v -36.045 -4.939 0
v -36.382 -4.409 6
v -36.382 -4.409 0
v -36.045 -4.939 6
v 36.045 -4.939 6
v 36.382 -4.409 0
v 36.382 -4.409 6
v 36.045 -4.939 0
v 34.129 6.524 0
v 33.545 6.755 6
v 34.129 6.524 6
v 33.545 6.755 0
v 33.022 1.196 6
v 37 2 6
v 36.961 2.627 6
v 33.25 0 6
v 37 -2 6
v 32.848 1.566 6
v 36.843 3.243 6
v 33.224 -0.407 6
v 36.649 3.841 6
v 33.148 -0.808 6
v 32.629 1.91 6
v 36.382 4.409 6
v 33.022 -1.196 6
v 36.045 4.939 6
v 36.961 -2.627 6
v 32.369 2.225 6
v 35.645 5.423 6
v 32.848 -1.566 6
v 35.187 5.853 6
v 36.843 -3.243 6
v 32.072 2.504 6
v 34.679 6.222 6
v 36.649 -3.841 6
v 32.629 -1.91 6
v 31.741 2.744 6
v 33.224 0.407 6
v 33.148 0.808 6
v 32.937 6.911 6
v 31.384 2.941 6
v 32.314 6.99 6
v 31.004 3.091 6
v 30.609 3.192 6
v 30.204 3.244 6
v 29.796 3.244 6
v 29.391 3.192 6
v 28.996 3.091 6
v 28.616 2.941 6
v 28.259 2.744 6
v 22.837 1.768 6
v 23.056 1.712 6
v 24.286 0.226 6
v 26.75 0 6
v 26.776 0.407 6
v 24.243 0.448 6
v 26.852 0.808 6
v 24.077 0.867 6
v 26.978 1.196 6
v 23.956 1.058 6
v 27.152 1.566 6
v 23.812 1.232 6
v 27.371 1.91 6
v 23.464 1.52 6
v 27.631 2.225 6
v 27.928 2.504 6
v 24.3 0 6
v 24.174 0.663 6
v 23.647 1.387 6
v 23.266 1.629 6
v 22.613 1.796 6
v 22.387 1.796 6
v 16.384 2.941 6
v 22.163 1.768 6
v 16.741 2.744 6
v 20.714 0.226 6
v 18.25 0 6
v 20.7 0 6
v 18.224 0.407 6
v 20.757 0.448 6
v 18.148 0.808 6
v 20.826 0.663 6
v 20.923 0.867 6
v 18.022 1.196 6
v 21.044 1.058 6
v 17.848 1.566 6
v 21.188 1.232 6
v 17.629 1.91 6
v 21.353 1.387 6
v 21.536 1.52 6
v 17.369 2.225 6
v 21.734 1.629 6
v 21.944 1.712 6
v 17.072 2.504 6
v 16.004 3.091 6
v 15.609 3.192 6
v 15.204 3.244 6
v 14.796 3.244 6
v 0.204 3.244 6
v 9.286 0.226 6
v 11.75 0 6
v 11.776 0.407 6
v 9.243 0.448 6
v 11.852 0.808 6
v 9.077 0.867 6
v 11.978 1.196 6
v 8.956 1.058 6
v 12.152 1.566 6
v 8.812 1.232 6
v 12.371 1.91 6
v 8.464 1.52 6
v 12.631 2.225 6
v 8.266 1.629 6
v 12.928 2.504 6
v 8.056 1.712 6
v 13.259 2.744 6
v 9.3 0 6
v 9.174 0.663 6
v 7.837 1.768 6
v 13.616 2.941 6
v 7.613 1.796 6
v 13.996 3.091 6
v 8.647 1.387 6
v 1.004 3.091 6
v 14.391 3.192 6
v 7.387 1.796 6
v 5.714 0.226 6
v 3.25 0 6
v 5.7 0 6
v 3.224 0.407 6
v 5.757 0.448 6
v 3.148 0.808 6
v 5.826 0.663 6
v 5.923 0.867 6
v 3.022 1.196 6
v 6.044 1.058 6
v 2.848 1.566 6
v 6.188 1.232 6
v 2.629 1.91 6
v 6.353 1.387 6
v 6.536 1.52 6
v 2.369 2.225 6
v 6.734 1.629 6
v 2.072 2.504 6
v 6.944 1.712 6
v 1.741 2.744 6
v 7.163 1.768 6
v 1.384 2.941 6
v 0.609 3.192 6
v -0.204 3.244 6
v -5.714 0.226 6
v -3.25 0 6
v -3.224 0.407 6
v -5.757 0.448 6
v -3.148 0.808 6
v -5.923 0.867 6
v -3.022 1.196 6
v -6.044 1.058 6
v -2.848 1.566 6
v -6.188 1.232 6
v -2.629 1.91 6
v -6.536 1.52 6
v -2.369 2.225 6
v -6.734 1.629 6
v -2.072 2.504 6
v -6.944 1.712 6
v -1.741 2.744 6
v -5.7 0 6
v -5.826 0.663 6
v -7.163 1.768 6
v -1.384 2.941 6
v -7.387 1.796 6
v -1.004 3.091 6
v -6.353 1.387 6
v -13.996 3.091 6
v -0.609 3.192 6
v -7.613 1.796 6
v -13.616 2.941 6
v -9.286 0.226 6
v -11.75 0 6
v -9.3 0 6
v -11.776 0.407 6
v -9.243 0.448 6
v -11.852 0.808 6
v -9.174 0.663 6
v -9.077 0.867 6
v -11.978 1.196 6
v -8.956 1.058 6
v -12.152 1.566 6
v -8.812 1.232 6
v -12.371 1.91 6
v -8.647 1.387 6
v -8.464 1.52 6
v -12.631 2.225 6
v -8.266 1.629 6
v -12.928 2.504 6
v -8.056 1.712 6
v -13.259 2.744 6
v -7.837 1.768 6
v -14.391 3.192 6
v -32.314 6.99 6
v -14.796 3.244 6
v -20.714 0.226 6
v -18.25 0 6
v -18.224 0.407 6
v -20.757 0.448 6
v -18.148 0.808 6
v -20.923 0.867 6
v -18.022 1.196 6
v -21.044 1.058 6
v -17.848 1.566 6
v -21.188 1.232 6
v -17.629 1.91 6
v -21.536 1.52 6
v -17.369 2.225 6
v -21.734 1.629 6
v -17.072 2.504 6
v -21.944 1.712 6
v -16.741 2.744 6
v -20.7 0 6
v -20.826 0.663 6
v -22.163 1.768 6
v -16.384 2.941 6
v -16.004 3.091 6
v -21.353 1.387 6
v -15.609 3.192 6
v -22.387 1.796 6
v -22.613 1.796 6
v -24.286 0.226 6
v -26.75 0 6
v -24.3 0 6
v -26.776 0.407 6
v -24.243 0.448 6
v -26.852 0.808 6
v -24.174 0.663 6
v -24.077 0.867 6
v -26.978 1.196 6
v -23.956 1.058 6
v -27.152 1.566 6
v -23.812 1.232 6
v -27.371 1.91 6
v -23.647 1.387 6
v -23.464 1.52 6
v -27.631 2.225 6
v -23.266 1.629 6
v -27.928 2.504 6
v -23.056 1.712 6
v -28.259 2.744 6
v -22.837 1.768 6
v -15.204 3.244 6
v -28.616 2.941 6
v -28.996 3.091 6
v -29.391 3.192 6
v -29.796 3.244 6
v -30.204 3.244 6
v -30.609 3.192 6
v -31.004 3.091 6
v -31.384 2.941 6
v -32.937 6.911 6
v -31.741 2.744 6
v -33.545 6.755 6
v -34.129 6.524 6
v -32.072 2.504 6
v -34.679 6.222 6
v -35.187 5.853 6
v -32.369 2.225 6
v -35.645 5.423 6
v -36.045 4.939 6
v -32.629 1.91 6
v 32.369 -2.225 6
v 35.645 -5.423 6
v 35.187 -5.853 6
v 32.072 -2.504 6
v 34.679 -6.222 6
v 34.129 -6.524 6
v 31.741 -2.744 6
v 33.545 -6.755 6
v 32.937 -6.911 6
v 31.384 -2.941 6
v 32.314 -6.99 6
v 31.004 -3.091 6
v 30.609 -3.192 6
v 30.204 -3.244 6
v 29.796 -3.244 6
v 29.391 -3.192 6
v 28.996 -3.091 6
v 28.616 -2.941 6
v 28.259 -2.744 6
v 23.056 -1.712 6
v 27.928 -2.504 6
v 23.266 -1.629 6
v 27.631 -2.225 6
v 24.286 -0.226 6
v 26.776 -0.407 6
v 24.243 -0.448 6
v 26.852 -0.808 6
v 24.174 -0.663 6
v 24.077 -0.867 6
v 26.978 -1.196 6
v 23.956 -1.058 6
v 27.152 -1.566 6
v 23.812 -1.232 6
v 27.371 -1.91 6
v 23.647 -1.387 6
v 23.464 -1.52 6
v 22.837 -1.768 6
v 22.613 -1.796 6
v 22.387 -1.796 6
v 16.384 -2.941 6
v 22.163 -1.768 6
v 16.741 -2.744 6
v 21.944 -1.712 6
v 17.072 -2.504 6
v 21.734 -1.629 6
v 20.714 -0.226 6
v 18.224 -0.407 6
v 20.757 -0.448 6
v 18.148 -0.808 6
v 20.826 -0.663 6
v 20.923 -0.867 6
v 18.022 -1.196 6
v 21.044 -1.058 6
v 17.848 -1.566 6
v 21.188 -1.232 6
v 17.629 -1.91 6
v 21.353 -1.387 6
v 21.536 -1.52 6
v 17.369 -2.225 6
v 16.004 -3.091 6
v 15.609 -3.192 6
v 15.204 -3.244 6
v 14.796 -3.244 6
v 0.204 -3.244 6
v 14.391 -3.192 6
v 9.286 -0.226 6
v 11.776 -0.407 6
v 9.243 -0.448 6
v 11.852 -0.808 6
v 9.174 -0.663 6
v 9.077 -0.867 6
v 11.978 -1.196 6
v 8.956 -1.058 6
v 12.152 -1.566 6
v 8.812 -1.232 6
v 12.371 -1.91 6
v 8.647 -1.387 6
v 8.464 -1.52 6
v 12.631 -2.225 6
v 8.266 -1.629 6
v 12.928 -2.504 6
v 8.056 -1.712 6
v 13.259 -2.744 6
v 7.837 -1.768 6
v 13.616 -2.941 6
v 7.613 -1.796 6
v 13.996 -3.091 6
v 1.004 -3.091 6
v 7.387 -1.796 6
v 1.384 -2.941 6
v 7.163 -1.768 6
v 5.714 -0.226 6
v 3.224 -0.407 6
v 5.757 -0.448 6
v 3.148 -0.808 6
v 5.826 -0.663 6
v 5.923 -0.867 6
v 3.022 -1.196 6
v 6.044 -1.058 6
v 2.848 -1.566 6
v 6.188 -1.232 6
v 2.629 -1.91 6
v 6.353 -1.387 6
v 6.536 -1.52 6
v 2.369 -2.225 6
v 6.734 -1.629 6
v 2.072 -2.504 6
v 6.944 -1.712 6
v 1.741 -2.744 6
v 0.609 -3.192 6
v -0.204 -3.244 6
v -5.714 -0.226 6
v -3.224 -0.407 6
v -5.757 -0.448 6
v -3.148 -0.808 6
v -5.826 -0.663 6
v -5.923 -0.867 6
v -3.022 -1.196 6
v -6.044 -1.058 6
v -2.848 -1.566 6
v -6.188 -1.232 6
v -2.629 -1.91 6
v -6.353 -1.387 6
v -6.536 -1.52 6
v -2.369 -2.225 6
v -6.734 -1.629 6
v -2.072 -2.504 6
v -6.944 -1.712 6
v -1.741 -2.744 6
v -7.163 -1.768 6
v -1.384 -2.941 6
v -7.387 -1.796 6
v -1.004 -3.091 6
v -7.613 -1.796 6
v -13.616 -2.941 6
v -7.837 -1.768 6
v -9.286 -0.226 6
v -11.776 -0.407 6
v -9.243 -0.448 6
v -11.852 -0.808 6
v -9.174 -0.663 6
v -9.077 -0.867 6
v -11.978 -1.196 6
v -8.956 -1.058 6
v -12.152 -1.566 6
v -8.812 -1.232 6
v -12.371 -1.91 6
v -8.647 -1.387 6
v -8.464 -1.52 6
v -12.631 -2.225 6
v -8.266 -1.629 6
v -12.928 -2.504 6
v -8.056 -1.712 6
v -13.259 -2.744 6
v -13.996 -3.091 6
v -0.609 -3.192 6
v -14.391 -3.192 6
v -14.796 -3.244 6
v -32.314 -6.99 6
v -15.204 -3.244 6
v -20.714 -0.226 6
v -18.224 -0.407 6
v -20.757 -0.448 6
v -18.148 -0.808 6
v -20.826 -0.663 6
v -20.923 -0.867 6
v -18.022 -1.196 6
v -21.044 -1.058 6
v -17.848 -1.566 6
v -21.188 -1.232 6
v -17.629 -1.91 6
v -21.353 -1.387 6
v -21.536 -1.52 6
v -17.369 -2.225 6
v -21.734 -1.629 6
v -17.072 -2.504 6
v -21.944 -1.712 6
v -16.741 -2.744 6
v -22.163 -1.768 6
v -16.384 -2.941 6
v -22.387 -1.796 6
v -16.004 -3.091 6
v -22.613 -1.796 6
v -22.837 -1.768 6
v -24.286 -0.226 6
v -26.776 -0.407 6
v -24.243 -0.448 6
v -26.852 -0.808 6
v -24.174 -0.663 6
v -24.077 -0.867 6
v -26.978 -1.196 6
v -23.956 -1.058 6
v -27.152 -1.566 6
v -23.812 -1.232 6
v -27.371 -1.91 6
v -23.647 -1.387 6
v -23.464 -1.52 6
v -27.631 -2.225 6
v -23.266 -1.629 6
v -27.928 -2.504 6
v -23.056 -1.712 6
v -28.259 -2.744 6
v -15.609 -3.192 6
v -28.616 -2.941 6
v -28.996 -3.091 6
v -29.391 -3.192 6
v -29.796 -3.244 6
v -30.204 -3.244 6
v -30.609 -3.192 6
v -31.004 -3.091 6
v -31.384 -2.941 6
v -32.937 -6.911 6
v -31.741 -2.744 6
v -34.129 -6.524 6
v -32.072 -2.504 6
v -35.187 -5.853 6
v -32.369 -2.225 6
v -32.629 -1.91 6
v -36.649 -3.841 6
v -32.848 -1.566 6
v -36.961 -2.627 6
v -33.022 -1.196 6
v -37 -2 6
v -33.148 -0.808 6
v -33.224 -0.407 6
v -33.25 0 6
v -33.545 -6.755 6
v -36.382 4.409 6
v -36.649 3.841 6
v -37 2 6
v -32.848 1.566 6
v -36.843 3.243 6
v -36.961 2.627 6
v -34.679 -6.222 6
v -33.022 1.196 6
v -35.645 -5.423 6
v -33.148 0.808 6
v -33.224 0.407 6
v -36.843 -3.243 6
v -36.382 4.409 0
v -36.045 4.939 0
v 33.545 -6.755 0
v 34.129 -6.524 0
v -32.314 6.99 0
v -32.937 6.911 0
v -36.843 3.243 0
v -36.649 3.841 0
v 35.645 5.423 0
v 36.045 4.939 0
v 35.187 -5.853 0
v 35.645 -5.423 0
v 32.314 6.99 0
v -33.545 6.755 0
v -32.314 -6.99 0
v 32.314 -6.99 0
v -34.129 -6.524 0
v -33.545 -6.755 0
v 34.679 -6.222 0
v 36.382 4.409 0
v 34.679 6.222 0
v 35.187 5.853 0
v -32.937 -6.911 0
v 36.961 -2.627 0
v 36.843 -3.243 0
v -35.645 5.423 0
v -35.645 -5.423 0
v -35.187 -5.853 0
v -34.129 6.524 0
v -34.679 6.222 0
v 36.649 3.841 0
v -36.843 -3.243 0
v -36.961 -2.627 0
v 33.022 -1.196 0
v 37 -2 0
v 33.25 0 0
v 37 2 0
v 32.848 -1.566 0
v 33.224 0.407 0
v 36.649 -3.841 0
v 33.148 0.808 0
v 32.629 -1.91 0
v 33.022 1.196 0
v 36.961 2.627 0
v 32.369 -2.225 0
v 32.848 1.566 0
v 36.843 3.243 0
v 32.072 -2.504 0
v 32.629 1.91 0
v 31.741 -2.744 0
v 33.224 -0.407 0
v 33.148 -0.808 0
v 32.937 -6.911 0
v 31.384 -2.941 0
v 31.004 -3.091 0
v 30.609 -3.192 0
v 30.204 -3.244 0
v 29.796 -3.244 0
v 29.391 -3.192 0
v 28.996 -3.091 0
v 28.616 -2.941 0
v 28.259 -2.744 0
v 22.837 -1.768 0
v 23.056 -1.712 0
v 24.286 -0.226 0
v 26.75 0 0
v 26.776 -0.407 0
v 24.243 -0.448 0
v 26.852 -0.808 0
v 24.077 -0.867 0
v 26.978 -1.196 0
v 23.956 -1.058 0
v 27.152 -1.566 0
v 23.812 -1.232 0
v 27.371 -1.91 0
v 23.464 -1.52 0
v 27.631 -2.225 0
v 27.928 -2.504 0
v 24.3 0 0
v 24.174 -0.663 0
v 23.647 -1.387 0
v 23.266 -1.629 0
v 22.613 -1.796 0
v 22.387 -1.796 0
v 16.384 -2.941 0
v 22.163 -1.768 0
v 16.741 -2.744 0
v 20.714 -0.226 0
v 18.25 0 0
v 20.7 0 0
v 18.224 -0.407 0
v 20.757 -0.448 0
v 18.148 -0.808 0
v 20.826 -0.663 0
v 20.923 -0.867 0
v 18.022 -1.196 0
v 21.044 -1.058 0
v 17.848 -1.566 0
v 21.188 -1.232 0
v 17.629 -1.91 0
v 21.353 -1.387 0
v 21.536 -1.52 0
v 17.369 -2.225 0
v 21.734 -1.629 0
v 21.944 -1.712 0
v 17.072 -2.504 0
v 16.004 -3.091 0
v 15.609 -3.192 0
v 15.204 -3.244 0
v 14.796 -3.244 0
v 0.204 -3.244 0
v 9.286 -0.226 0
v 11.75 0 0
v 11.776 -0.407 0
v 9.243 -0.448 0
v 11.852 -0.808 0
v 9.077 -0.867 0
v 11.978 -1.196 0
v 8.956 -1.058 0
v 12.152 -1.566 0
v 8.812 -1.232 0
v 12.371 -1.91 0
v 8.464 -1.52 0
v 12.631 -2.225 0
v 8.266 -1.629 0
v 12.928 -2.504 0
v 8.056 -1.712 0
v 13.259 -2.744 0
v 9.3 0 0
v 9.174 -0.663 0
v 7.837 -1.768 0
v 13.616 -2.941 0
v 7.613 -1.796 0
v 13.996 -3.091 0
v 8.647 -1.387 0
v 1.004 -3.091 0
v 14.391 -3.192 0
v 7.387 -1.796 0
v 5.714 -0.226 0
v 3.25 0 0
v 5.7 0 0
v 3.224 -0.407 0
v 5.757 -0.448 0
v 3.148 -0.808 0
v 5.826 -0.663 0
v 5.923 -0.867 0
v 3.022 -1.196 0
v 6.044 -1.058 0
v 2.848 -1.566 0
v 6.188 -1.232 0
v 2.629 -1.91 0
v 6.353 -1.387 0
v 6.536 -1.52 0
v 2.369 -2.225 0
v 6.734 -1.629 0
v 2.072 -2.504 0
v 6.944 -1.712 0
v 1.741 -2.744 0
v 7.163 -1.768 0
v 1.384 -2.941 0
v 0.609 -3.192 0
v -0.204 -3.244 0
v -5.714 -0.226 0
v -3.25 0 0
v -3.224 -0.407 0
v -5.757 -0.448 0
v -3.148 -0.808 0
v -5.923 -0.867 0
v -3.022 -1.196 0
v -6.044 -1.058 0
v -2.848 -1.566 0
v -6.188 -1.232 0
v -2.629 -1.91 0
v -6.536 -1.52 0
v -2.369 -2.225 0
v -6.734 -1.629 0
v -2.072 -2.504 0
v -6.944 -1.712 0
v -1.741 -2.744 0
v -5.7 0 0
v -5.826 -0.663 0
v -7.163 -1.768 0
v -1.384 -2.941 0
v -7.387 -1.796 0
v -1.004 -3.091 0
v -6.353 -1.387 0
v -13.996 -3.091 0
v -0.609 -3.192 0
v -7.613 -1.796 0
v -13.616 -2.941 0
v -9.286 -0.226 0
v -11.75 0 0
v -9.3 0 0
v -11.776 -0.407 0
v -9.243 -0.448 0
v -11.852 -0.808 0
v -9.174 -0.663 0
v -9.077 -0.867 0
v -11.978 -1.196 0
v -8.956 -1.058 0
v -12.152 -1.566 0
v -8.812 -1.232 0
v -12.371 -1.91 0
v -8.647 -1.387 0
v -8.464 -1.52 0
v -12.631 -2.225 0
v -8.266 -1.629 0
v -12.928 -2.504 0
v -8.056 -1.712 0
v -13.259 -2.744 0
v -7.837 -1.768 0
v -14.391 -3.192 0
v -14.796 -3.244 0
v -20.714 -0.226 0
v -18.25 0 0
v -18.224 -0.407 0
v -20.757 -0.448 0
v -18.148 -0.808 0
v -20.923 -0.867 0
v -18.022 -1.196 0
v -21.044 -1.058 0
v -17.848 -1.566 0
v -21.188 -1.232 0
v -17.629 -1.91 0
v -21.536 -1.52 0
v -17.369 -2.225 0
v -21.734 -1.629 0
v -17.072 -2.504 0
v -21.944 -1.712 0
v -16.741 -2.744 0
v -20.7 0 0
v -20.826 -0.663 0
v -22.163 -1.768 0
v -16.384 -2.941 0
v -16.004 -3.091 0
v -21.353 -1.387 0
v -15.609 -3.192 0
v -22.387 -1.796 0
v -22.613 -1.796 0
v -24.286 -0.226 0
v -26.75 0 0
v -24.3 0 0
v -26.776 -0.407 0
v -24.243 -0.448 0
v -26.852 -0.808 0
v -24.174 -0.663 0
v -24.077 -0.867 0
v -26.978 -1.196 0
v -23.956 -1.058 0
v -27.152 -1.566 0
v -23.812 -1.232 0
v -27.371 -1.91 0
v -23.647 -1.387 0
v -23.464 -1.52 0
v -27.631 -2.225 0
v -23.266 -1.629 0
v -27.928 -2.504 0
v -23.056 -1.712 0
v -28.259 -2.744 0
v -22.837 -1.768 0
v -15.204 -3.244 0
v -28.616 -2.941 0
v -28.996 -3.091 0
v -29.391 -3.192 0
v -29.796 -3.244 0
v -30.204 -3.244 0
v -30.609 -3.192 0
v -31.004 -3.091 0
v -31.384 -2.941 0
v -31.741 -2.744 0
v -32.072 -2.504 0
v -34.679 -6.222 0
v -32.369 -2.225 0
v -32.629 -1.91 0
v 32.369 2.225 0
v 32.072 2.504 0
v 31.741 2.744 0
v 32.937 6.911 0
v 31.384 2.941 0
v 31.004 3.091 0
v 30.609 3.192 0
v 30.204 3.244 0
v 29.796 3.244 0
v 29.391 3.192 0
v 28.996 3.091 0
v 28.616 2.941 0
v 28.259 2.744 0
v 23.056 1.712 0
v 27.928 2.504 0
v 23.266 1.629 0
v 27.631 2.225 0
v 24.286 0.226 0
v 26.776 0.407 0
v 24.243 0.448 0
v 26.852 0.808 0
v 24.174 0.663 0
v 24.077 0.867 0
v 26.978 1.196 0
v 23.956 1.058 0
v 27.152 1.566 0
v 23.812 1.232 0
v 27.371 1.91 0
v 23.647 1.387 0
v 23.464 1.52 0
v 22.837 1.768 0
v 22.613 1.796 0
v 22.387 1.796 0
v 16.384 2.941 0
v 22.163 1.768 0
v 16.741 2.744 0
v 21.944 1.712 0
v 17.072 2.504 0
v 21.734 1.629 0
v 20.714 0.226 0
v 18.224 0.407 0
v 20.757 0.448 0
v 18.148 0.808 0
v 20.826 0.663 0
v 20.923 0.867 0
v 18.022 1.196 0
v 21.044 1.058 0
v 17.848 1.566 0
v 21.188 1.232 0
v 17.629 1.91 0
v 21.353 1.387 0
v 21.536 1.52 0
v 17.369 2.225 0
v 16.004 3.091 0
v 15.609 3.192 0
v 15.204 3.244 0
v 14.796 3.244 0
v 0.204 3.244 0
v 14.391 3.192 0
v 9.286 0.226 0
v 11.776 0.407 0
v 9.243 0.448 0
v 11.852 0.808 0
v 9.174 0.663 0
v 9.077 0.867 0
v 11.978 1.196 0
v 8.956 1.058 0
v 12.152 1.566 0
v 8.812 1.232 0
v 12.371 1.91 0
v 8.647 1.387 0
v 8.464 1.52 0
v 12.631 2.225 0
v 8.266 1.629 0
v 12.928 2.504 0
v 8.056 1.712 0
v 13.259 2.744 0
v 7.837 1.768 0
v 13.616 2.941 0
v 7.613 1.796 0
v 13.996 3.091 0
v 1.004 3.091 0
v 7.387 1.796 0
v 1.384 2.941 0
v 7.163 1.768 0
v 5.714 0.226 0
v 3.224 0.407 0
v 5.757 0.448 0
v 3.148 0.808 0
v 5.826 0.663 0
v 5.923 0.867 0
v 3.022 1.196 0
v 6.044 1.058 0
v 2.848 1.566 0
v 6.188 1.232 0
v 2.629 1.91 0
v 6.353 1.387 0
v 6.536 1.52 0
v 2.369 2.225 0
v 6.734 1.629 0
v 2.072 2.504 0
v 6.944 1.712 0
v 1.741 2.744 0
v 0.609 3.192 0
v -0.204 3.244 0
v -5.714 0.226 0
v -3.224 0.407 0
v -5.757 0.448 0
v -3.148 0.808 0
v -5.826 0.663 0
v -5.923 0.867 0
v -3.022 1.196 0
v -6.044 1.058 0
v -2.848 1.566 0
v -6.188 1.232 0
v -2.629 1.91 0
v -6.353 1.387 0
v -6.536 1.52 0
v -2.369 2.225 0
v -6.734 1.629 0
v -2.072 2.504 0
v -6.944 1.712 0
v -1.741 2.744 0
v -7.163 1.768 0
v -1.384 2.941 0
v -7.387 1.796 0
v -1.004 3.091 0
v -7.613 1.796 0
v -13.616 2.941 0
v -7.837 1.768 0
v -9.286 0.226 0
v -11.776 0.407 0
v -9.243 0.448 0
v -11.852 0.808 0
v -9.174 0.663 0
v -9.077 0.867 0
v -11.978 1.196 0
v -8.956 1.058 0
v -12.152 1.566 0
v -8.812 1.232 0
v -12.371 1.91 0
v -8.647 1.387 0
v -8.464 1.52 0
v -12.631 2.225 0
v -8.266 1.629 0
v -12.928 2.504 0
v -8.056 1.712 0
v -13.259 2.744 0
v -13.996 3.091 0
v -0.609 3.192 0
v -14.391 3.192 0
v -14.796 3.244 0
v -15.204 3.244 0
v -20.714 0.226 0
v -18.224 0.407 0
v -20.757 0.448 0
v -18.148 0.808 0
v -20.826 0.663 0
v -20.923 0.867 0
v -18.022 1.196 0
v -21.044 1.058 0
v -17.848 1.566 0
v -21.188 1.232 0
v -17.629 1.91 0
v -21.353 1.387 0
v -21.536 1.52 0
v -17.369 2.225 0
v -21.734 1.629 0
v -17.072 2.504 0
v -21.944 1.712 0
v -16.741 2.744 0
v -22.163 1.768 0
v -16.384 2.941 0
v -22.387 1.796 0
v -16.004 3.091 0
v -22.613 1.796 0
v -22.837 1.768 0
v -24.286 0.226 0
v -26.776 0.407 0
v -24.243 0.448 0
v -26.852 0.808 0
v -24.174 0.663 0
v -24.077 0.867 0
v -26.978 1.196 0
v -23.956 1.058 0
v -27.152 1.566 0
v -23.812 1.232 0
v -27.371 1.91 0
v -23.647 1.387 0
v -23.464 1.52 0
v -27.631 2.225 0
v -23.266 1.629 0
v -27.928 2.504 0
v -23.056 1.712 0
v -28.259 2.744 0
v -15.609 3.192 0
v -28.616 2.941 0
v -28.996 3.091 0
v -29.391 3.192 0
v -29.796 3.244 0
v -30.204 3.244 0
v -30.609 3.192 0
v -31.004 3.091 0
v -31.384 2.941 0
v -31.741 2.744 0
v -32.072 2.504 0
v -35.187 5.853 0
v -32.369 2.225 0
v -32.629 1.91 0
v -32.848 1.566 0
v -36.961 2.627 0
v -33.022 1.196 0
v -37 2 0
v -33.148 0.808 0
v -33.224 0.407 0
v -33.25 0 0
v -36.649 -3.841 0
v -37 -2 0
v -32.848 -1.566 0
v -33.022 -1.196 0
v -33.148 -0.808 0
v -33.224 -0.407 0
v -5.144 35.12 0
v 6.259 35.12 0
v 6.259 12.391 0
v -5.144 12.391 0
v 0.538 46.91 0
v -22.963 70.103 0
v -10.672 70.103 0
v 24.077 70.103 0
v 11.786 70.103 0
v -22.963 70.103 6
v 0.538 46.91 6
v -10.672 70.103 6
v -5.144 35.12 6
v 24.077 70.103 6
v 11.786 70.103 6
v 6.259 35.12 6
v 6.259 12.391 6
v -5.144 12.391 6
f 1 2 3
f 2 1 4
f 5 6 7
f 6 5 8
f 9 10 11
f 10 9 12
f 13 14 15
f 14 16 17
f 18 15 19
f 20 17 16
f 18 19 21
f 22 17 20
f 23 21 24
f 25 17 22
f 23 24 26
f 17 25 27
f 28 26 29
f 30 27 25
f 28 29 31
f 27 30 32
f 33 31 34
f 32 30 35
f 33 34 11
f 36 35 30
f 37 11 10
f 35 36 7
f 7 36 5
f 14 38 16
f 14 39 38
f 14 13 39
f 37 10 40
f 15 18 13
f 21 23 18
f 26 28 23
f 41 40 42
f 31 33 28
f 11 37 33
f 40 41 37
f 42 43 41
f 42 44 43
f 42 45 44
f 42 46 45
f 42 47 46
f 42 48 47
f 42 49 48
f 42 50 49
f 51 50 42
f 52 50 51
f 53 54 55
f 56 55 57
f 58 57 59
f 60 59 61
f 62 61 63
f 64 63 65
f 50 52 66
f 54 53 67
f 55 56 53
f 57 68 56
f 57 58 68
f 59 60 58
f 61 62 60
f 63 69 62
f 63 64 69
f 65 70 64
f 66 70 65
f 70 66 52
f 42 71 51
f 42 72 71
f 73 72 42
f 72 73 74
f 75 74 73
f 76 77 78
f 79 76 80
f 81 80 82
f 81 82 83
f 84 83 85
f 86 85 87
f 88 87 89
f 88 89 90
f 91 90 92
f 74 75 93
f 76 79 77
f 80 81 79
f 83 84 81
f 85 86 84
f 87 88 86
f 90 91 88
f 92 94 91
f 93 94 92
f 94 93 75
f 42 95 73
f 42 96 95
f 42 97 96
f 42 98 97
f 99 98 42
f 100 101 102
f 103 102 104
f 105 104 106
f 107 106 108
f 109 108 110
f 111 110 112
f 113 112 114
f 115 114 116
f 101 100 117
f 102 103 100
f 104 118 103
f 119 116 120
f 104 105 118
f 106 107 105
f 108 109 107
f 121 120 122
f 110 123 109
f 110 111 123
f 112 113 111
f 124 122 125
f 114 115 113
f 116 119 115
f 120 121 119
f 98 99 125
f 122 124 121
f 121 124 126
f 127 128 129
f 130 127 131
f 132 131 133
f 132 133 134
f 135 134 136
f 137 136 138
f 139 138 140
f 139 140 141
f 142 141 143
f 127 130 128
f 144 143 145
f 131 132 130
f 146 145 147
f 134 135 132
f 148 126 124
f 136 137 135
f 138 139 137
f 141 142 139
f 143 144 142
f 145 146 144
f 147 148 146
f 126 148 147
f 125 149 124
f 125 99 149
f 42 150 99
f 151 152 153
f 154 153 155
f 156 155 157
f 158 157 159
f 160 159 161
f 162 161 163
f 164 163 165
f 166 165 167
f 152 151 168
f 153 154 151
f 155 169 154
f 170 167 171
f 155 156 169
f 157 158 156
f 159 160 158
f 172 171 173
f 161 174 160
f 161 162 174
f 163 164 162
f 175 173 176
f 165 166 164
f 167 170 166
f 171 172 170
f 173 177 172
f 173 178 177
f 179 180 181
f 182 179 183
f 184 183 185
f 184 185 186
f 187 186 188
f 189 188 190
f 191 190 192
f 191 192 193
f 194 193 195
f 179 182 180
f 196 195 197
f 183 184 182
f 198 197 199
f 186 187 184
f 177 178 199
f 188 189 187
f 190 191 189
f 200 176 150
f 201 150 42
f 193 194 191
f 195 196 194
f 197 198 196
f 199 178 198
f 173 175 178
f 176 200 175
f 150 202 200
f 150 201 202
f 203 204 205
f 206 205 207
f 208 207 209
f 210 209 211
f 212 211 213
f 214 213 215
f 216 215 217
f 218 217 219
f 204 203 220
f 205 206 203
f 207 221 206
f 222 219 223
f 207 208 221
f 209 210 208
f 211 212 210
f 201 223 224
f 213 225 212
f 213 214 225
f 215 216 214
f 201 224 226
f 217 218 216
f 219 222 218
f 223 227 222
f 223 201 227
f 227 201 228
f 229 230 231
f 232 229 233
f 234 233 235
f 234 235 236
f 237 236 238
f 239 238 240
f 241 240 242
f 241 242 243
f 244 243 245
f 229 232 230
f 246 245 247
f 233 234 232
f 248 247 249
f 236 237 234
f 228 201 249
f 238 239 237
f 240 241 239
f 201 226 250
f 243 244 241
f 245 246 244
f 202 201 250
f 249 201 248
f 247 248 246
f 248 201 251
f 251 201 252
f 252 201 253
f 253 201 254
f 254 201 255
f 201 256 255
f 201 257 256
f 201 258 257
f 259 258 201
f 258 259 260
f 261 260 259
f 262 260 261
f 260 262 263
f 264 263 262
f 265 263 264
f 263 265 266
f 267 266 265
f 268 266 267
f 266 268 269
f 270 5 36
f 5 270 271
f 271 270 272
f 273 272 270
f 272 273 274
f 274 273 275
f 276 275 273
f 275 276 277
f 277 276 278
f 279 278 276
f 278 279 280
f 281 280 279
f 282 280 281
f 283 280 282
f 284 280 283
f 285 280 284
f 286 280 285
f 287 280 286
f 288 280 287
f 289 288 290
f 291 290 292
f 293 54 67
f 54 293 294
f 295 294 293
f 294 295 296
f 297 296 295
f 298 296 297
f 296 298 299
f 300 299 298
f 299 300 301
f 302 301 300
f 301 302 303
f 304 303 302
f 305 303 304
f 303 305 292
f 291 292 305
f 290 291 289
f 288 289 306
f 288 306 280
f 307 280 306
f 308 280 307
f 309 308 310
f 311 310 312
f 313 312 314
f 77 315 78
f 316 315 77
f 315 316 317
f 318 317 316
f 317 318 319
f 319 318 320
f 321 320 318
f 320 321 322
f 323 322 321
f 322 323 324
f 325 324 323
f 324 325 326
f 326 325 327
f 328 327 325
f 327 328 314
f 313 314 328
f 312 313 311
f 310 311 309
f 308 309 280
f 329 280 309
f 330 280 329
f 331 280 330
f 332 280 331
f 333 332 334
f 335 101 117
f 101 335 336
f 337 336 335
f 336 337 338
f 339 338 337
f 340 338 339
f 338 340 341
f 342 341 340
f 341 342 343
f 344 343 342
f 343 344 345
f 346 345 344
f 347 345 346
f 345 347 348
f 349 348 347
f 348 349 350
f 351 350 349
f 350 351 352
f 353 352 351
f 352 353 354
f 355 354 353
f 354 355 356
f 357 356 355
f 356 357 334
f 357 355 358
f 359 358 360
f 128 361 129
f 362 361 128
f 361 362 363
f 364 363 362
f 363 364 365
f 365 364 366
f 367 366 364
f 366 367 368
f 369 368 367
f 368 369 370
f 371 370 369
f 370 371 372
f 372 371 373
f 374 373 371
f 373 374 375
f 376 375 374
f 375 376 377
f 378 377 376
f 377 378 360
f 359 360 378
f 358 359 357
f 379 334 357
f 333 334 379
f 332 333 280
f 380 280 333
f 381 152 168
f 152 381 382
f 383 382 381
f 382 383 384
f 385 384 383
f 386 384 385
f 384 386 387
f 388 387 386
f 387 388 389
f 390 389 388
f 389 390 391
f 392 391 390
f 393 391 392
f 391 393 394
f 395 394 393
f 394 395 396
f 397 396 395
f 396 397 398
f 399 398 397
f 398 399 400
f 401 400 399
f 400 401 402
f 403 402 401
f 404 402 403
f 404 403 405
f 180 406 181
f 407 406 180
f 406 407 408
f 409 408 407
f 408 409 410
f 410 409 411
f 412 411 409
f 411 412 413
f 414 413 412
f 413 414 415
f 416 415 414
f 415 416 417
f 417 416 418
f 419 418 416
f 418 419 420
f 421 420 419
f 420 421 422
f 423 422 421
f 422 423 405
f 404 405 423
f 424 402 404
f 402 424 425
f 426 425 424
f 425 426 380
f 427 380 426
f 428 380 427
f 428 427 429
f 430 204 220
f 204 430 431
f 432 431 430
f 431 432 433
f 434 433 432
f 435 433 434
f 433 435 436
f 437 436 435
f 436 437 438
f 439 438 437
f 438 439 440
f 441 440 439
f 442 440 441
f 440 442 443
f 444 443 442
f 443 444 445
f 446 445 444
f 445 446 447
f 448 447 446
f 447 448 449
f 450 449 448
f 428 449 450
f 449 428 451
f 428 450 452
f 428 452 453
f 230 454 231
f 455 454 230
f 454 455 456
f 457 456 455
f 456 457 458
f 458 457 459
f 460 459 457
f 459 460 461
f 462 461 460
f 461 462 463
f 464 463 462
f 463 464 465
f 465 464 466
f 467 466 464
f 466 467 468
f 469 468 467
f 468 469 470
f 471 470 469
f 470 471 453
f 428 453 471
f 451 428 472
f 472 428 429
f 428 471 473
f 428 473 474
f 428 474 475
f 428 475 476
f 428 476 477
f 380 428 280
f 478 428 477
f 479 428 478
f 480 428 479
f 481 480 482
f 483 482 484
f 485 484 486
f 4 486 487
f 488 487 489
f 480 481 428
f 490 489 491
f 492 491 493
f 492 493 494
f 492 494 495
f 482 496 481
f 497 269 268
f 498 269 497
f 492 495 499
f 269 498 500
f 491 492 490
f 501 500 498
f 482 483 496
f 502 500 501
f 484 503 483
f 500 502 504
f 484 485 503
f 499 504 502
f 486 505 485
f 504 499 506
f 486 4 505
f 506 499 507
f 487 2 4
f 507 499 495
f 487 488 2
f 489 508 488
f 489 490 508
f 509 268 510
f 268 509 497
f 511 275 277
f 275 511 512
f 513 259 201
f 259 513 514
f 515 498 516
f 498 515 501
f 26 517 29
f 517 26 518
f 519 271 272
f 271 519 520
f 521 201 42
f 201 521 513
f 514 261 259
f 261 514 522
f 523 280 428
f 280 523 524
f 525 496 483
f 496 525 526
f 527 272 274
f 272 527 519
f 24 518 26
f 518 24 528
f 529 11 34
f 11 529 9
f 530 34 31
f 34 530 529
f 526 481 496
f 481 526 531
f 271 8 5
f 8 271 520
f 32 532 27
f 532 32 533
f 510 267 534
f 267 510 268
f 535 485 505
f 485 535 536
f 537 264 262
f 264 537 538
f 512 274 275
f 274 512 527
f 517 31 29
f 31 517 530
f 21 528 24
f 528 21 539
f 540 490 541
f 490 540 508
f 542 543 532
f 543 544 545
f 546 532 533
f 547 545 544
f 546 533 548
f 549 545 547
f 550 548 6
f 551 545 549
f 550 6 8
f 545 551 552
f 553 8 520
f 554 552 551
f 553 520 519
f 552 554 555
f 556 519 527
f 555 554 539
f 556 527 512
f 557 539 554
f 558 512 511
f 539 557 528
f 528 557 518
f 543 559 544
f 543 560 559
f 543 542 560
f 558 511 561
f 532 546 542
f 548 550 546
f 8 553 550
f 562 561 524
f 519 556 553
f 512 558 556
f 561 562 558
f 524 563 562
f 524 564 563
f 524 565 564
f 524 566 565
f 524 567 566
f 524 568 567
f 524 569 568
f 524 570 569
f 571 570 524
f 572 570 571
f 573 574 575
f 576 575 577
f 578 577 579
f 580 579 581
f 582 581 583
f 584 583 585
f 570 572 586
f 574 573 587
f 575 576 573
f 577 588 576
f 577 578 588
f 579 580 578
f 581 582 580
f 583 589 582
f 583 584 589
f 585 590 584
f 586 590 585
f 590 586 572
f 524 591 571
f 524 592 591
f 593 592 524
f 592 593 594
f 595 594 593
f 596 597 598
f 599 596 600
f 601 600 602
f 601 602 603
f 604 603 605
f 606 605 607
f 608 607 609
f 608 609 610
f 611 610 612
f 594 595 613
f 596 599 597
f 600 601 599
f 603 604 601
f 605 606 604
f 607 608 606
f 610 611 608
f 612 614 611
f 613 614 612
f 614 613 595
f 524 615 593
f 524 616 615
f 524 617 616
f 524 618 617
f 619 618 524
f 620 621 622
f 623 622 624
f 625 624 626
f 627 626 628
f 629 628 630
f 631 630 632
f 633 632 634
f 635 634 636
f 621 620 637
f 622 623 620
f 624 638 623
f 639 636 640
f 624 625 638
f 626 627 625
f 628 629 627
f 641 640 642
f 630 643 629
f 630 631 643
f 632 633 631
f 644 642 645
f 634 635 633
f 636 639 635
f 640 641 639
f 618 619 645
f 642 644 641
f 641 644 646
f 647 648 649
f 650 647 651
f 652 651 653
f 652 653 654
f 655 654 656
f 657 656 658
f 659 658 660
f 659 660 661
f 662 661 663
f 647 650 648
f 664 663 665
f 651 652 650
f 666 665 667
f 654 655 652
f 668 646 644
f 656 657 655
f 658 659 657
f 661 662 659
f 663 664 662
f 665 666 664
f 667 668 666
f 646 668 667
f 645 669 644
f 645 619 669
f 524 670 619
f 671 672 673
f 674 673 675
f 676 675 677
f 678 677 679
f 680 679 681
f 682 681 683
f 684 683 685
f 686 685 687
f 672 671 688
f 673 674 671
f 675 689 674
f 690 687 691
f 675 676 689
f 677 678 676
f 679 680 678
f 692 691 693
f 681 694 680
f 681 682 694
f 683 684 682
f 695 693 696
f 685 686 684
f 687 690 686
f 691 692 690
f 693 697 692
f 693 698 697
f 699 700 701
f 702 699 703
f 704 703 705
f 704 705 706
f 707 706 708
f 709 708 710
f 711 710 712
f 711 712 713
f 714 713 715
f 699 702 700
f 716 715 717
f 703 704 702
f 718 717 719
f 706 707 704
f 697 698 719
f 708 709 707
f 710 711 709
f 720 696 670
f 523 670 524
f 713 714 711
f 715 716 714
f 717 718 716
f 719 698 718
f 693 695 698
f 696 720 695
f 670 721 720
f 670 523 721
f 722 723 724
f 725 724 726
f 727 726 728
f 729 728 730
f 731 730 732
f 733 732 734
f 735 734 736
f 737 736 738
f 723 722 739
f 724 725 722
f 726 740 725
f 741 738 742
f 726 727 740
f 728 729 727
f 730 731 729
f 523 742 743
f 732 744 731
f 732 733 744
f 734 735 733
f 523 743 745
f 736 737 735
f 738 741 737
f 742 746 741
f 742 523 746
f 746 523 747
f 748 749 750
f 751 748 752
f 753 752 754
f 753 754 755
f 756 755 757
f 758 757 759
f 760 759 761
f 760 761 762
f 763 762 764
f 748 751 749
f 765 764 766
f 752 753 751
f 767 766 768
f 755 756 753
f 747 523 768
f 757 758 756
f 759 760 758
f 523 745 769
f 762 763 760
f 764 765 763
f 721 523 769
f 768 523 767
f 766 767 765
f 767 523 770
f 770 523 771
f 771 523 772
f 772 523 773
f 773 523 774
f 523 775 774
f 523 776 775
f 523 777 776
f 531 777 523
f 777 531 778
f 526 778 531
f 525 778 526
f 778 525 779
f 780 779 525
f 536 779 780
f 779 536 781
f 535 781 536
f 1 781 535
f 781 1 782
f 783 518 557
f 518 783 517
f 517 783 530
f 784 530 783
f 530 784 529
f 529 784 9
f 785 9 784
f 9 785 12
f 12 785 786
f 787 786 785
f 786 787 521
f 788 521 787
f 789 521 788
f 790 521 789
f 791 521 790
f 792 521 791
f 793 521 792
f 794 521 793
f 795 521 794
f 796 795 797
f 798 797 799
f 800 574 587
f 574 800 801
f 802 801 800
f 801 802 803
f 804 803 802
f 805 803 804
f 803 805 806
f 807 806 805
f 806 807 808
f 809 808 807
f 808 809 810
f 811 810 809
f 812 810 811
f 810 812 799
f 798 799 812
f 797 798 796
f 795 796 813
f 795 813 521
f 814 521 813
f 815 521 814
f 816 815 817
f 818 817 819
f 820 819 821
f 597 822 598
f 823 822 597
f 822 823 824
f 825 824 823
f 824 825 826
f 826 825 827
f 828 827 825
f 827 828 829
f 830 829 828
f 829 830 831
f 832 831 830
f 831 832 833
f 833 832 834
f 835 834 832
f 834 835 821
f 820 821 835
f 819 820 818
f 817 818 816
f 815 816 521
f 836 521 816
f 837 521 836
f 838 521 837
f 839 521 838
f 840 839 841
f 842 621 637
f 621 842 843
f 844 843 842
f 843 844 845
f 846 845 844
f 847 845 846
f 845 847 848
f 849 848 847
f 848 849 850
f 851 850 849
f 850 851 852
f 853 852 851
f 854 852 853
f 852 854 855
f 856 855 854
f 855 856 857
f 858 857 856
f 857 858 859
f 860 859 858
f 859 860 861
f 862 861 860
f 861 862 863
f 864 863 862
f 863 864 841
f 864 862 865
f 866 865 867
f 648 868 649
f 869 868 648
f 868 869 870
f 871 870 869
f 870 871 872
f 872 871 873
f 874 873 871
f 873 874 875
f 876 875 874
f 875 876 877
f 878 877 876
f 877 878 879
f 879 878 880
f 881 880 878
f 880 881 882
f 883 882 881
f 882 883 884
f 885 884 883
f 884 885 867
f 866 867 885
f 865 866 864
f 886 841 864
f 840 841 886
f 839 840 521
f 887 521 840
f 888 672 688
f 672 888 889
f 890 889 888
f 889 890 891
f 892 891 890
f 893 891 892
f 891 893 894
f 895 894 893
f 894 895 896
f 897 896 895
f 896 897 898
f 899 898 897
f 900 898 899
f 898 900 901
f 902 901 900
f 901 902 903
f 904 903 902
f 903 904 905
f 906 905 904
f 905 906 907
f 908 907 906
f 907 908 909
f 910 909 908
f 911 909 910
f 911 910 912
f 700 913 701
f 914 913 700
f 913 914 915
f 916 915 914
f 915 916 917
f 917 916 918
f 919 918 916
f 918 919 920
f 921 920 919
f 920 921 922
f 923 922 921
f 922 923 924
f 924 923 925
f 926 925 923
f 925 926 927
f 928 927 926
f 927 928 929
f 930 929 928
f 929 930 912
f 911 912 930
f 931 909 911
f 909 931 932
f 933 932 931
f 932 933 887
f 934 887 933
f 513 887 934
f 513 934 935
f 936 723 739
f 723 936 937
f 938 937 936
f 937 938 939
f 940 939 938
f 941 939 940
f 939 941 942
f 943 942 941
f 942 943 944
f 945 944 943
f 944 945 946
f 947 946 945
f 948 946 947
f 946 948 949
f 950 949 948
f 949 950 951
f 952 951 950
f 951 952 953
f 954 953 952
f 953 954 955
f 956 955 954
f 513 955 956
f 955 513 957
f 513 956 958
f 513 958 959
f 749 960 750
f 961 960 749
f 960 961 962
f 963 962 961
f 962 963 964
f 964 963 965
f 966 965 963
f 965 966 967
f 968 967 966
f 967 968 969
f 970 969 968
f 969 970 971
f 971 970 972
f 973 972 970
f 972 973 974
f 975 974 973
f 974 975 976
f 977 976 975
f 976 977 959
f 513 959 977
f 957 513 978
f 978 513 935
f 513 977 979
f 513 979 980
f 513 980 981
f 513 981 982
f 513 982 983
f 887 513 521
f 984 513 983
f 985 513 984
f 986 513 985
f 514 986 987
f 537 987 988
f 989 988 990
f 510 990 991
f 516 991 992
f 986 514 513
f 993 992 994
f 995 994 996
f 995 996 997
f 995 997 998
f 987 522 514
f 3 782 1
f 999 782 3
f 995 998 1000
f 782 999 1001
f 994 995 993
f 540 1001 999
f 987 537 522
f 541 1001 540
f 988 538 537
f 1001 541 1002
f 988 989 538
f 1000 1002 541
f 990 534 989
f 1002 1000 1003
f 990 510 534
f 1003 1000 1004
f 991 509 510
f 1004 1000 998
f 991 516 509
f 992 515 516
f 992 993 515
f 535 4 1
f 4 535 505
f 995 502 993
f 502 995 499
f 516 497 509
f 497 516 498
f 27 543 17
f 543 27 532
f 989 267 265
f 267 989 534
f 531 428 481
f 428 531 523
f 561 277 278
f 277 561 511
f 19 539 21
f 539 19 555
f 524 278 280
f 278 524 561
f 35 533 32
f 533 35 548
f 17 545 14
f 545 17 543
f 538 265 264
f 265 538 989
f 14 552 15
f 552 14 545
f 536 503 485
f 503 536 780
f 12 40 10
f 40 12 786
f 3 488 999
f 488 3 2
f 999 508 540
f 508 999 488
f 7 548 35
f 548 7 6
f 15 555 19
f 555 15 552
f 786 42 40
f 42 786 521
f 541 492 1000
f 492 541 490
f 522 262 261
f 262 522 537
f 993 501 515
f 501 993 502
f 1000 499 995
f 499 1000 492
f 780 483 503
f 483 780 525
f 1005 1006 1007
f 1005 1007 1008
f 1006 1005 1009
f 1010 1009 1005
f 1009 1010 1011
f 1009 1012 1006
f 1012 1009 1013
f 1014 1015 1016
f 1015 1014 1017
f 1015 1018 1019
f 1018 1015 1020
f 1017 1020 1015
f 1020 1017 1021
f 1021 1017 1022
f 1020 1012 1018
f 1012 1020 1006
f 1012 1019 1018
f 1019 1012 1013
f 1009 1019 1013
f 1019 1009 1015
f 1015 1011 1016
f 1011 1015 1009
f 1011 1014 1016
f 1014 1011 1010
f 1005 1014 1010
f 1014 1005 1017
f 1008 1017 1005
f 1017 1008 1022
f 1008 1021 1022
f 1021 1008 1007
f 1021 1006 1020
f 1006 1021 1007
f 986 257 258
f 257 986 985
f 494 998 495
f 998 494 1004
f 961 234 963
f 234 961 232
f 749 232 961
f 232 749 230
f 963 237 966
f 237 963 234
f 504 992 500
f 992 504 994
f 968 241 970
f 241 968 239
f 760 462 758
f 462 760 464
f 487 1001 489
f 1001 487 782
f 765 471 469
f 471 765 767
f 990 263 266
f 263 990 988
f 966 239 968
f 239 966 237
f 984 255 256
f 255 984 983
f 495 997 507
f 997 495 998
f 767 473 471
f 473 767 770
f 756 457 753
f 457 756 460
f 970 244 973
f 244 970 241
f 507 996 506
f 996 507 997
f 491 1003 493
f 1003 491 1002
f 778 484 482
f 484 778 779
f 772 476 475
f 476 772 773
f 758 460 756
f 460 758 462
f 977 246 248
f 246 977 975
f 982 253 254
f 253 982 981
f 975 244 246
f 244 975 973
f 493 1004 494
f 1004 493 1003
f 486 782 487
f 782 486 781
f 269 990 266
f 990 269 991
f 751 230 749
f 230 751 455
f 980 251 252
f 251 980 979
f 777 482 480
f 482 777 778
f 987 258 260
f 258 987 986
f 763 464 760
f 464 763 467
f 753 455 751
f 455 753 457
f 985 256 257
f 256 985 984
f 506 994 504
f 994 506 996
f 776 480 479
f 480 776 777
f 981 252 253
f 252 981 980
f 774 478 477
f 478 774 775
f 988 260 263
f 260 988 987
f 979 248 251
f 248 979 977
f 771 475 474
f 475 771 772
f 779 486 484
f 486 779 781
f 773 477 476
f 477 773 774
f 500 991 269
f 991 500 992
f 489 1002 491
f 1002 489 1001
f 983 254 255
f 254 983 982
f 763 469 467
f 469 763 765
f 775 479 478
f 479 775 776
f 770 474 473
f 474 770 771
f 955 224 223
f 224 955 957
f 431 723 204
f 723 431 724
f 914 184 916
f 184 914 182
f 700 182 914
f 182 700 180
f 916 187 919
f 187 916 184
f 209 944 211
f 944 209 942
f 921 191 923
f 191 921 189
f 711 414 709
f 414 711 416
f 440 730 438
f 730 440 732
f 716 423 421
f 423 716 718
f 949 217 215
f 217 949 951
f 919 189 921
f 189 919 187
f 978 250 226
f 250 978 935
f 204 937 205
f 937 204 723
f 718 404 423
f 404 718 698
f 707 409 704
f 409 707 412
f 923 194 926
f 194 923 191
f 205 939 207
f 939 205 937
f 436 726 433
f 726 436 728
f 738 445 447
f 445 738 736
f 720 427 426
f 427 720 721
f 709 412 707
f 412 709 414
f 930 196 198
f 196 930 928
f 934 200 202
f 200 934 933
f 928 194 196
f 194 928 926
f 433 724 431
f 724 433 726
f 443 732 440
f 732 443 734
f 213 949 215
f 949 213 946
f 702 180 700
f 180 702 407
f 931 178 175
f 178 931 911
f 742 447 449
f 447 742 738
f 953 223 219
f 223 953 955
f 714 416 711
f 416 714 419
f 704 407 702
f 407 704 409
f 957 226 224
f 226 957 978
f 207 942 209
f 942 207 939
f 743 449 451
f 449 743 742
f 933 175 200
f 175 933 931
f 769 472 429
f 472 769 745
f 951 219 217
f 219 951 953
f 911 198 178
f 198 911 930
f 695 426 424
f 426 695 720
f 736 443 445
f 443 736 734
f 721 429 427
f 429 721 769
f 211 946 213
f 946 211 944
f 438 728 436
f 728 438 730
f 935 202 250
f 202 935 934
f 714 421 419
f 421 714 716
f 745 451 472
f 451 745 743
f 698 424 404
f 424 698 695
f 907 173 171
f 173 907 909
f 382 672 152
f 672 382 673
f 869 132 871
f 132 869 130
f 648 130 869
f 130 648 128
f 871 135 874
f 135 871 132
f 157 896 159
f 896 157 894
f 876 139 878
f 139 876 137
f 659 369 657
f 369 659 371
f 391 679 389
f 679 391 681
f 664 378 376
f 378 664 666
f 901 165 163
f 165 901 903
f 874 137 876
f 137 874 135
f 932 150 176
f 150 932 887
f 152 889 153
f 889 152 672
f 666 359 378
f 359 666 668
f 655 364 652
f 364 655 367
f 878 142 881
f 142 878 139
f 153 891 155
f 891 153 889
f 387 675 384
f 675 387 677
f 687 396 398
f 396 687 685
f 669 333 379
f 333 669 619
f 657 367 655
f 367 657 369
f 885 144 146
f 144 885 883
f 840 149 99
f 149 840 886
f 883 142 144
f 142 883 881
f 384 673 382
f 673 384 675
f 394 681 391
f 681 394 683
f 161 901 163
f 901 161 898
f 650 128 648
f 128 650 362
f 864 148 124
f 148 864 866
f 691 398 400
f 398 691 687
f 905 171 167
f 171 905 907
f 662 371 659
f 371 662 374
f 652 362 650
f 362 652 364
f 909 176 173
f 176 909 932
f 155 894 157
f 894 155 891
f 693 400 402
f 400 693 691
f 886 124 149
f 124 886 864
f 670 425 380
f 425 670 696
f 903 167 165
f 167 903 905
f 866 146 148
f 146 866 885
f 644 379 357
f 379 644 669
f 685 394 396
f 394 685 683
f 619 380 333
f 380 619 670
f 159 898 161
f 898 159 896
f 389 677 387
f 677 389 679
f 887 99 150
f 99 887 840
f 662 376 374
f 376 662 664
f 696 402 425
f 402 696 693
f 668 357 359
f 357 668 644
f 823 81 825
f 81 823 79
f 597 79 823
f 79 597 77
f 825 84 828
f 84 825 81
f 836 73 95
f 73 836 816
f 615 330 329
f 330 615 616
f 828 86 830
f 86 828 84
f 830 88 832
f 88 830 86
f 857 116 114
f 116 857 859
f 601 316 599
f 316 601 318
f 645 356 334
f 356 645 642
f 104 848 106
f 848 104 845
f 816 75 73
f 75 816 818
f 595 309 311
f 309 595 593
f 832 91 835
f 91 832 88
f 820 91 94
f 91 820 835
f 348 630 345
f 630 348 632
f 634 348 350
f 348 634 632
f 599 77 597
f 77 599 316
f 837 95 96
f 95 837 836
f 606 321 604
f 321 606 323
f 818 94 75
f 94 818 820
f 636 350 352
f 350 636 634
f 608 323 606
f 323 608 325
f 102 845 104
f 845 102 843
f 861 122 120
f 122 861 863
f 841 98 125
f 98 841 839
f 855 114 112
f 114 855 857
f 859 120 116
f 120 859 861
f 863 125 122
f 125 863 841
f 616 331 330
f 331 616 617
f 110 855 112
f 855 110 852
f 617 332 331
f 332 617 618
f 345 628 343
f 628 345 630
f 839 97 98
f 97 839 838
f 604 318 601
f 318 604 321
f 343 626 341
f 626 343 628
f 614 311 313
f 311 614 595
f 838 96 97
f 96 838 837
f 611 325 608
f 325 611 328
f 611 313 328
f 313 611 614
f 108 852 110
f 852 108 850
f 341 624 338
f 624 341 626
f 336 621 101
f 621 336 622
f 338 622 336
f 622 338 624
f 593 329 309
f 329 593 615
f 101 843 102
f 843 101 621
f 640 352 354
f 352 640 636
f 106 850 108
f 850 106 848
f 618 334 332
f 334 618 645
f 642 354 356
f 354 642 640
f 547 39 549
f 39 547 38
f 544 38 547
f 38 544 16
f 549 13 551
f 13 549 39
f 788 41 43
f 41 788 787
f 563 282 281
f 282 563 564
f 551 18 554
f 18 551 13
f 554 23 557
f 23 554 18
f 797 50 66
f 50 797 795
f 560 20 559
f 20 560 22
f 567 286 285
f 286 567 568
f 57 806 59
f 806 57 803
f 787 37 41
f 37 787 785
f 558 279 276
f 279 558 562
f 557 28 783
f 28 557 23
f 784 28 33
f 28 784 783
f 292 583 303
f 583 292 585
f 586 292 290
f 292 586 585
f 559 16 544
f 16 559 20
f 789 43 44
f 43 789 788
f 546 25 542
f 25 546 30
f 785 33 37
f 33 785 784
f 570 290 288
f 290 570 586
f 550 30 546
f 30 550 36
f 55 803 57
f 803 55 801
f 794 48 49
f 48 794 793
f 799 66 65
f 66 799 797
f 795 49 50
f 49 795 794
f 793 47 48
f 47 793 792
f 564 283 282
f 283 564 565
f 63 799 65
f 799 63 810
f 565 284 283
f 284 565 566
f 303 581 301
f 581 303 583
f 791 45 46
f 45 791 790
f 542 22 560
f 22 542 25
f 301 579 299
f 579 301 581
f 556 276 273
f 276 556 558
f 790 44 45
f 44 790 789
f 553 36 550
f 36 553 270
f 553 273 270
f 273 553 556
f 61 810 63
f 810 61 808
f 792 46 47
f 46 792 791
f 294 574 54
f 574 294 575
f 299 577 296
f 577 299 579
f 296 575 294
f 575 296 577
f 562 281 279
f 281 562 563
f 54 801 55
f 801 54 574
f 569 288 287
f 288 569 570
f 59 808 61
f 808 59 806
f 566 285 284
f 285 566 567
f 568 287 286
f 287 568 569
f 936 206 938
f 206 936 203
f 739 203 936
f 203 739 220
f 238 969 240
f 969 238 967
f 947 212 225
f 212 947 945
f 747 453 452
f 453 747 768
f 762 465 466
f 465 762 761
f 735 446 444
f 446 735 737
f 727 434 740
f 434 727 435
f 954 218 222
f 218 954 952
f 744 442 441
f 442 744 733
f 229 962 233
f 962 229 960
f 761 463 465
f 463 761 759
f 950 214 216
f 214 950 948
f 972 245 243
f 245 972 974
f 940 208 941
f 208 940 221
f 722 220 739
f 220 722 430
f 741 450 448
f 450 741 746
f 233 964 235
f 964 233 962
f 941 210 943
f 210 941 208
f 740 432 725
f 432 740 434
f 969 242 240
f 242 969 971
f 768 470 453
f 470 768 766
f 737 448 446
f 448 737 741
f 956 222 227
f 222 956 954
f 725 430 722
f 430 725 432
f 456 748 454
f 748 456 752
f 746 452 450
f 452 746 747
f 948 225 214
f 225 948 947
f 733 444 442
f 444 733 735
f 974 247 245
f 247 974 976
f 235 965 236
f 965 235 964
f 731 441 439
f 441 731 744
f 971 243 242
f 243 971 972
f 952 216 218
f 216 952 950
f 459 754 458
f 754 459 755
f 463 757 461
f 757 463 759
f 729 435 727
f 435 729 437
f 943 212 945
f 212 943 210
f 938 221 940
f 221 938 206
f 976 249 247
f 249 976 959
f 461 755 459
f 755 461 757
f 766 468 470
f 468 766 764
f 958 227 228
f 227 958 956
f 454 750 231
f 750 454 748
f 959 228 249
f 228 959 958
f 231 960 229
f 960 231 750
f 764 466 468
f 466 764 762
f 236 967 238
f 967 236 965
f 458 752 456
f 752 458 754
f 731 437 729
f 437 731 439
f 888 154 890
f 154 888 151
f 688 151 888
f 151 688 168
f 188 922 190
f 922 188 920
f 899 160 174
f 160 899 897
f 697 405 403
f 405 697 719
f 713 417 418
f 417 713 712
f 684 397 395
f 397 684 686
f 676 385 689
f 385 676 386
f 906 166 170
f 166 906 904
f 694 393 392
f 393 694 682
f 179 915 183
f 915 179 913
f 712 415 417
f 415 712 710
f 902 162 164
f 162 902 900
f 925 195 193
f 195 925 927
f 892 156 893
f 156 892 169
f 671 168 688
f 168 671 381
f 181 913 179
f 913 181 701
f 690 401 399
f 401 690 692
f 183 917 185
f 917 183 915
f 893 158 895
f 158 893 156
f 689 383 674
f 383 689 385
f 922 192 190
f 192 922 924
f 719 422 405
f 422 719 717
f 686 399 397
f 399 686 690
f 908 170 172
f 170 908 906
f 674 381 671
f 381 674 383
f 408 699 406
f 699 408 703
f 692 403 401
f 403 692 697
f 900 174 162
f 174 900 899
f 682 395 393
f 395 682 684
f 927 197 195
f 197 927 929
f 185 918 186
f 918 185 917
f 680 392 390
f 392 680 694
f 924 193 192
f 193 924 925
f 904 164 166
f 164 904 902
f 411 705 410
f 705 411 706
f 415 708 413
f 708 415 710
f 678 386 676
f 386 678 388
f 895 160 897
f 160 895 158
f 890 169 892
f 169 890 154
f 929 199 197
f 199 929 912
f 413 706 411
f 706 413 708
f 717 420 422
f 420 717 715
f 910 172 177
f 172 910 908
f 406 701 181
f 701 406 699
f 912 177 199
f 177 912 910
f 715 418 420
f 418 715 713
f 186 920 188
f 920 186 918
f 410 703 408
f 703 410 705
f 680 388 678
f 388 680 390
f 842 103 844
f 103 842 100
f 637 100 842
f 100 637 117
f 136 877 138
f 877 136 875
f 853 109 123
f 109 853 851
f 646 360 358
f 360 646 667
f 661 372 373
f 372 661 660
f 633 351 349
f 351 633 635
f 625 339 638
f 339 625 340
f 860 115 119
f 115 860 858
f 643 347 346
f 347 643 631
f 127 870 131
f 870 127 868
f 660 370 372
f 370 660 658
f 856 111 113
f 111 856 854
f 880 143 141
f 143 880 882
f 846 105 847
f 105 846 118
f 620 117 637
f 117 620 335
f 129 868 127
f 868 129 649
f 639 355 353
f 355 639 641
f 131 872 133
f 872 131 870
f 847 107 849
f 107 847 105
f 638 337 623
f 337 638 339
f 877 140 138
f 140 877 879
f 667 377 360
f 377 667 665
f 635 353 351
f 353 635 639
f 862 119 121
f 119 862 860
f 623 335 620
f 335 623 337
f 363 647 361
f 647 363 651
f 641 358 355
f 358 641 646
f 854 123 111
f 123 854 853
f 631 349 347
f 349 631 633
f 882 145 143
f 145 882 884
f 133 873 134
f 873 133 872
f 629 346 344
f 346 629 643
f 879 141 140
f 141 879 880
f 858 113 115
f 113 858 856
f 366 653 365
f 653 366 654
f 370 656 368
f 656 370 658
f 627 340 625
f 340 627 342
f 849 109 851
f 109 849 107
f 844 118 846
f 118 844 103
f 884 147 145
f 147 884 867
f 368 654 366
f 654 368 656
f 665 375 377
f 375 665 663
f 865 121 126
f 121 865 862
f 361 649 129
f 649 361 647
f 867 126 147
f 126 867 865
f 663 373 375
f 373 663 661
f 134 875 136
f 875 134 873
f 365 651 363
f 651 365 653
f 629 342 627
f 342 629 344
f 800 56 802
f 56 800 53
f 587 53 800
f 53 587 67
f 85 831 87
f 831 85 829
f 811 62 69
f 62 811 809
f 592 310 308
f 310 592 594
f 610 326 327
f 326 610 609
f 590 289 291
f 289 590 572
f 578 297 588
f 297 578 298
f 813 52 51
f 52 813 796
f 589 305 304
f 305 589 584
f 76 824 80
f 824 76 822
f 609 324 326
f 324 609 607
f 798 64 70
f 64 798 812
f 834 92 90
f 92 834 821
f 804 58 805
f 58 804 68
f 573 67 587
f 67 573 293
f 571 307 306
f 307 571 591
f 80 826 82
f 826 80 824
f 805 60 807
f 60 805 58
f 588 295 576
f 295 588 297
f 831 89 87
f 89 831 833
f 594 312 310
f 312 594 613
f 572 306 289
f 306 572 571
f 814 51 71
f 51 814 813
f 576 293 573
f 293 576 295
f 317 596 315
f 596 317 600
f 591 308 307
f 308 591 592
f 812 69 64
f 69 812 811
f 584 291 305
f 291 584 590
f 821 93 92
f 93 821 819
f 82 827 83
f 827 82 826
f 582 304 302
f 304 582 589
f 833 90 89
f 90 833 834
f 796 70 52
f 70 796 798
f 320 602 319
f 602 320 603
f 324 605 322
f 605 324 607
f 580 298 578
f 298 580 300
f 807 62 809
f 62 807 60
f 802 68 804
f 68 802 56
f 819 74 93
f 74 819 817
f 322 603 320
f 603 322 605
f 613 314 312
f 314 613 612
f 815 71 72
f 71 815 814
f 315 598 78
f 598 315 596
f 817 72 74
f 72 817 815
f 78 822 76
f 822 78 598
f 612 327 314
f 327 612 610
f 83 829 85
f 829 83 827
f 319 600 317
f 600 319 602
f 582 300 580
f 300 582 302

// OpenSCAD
$fn = 50;


difference() {
	union() {
		hull() {
			translate(v = [-32.0000000000, 2.0000000000, 0]) {
				cylinder(h = 6, r = 5);
			}
			translate(v = [32.0000000000, 2.0000000000, 0]) {
				cylinder(h = 6, r = 5);
			}
			translate(v = [-32.0000000000, -2.0000000000, 0]) {
				cylinder(h = 6, r = 5);
			}
			translate(v = [32.0000000000, -2.0000000000, 0]) {
				cylinder(h = 6, r = 5);
			}
		}
		translate(v = [0, 68.7500000000, 0]) {
			linear_extrude(height = 6) {
				text(font = "DejaVu Sans Mono:style=Bold", halign = "center", size = 57.0000000000, text = "Y", valign = "top");
			}
		}
	}
	union() {
		translate(v = [-30.0000000000, 0.0000000000, 0]) {
			translate(v = [0, 0, -100]) {
				cylinder(h = 200, r = 3.2500000000);
			}
		}
		translate(v = [-15.0000000000, 0.0000000000, 0]) {
			translate(v = [0, 0, -100]) {
				cylinder(h = 200, r = 3.2500000000);
			}
		}
		translate(v = [0, 0, -100]) {
			cylinder(h = 200, r = 3.2500000000);
		}
		translate(v = [15.0000000000, 0.0000000000, 0]) {
			translate(v = [0, 0, -100]) {
				cylinder(h = 200, r = 3.2500000000);
			}
		}
		translate(v = [30.0000000000, 0.0000000000, 0]) {
			translate(v = [0, 0, -100]) {
				cylinder(h = 200, r = 3.2500000000);
			}
		}
		translate(v = [-30.0000000000, 0.0000000000, 0]) {
			translate(v = [0, 0, -100]) {
				cylinder(h = 200, r = 1.8000000000);
			}
		}
		translate(v = [-22.5000000000, 0.0000000000, 0]) {
			translate(v = [0, 0, -100]) {
				cylinder(h = 200, r = 1.8000000000);
			}
		}
		translate(v = [-15.0000000000, 0.0000000000, 0]) {
			translate(v = [0, 0, -100]) {
				cylinder(h = 200, r = 1.8000000000);
			}
		}
		translate(v = [-7.5000000000, 0.0000000000, 0]) {
			translate(v = [0, 0, -100]) {
				cylinder(h = 200, r = 1.8000000000);
			}
		}
		translate(v = [0, 0, -100]) {
			cylinder(h = 200, r = 1.8000000000);
		}
		translate(v = [7.5000000000, 0.0000000000, 0]) {
			translate(v = [0, 0, -100]) {
				cylinder(h = 200, r = 1.8000000000);
			}
		}
		translate(v = [15.0000000000, 0.0000000000, 0]) {
			translate(v = [0, 0, -100]) {
				cylinder(h = 200, r = 1.8000000000);
			}
		}
		translate(v = [22.5000000000, 0.0000000000, 0]) {
			translate(v = [0, 0, -100]) {
				cylinder(h = 200, r = 1.8000000000);
			}
		}
		translate(v = [30.0000000000, 0.0000000000, 0]) {
			translate(v = [0, 0, -100]) {
				cylinder(h = 200, r = 1.8000000000);
			}
		}
	}
}
